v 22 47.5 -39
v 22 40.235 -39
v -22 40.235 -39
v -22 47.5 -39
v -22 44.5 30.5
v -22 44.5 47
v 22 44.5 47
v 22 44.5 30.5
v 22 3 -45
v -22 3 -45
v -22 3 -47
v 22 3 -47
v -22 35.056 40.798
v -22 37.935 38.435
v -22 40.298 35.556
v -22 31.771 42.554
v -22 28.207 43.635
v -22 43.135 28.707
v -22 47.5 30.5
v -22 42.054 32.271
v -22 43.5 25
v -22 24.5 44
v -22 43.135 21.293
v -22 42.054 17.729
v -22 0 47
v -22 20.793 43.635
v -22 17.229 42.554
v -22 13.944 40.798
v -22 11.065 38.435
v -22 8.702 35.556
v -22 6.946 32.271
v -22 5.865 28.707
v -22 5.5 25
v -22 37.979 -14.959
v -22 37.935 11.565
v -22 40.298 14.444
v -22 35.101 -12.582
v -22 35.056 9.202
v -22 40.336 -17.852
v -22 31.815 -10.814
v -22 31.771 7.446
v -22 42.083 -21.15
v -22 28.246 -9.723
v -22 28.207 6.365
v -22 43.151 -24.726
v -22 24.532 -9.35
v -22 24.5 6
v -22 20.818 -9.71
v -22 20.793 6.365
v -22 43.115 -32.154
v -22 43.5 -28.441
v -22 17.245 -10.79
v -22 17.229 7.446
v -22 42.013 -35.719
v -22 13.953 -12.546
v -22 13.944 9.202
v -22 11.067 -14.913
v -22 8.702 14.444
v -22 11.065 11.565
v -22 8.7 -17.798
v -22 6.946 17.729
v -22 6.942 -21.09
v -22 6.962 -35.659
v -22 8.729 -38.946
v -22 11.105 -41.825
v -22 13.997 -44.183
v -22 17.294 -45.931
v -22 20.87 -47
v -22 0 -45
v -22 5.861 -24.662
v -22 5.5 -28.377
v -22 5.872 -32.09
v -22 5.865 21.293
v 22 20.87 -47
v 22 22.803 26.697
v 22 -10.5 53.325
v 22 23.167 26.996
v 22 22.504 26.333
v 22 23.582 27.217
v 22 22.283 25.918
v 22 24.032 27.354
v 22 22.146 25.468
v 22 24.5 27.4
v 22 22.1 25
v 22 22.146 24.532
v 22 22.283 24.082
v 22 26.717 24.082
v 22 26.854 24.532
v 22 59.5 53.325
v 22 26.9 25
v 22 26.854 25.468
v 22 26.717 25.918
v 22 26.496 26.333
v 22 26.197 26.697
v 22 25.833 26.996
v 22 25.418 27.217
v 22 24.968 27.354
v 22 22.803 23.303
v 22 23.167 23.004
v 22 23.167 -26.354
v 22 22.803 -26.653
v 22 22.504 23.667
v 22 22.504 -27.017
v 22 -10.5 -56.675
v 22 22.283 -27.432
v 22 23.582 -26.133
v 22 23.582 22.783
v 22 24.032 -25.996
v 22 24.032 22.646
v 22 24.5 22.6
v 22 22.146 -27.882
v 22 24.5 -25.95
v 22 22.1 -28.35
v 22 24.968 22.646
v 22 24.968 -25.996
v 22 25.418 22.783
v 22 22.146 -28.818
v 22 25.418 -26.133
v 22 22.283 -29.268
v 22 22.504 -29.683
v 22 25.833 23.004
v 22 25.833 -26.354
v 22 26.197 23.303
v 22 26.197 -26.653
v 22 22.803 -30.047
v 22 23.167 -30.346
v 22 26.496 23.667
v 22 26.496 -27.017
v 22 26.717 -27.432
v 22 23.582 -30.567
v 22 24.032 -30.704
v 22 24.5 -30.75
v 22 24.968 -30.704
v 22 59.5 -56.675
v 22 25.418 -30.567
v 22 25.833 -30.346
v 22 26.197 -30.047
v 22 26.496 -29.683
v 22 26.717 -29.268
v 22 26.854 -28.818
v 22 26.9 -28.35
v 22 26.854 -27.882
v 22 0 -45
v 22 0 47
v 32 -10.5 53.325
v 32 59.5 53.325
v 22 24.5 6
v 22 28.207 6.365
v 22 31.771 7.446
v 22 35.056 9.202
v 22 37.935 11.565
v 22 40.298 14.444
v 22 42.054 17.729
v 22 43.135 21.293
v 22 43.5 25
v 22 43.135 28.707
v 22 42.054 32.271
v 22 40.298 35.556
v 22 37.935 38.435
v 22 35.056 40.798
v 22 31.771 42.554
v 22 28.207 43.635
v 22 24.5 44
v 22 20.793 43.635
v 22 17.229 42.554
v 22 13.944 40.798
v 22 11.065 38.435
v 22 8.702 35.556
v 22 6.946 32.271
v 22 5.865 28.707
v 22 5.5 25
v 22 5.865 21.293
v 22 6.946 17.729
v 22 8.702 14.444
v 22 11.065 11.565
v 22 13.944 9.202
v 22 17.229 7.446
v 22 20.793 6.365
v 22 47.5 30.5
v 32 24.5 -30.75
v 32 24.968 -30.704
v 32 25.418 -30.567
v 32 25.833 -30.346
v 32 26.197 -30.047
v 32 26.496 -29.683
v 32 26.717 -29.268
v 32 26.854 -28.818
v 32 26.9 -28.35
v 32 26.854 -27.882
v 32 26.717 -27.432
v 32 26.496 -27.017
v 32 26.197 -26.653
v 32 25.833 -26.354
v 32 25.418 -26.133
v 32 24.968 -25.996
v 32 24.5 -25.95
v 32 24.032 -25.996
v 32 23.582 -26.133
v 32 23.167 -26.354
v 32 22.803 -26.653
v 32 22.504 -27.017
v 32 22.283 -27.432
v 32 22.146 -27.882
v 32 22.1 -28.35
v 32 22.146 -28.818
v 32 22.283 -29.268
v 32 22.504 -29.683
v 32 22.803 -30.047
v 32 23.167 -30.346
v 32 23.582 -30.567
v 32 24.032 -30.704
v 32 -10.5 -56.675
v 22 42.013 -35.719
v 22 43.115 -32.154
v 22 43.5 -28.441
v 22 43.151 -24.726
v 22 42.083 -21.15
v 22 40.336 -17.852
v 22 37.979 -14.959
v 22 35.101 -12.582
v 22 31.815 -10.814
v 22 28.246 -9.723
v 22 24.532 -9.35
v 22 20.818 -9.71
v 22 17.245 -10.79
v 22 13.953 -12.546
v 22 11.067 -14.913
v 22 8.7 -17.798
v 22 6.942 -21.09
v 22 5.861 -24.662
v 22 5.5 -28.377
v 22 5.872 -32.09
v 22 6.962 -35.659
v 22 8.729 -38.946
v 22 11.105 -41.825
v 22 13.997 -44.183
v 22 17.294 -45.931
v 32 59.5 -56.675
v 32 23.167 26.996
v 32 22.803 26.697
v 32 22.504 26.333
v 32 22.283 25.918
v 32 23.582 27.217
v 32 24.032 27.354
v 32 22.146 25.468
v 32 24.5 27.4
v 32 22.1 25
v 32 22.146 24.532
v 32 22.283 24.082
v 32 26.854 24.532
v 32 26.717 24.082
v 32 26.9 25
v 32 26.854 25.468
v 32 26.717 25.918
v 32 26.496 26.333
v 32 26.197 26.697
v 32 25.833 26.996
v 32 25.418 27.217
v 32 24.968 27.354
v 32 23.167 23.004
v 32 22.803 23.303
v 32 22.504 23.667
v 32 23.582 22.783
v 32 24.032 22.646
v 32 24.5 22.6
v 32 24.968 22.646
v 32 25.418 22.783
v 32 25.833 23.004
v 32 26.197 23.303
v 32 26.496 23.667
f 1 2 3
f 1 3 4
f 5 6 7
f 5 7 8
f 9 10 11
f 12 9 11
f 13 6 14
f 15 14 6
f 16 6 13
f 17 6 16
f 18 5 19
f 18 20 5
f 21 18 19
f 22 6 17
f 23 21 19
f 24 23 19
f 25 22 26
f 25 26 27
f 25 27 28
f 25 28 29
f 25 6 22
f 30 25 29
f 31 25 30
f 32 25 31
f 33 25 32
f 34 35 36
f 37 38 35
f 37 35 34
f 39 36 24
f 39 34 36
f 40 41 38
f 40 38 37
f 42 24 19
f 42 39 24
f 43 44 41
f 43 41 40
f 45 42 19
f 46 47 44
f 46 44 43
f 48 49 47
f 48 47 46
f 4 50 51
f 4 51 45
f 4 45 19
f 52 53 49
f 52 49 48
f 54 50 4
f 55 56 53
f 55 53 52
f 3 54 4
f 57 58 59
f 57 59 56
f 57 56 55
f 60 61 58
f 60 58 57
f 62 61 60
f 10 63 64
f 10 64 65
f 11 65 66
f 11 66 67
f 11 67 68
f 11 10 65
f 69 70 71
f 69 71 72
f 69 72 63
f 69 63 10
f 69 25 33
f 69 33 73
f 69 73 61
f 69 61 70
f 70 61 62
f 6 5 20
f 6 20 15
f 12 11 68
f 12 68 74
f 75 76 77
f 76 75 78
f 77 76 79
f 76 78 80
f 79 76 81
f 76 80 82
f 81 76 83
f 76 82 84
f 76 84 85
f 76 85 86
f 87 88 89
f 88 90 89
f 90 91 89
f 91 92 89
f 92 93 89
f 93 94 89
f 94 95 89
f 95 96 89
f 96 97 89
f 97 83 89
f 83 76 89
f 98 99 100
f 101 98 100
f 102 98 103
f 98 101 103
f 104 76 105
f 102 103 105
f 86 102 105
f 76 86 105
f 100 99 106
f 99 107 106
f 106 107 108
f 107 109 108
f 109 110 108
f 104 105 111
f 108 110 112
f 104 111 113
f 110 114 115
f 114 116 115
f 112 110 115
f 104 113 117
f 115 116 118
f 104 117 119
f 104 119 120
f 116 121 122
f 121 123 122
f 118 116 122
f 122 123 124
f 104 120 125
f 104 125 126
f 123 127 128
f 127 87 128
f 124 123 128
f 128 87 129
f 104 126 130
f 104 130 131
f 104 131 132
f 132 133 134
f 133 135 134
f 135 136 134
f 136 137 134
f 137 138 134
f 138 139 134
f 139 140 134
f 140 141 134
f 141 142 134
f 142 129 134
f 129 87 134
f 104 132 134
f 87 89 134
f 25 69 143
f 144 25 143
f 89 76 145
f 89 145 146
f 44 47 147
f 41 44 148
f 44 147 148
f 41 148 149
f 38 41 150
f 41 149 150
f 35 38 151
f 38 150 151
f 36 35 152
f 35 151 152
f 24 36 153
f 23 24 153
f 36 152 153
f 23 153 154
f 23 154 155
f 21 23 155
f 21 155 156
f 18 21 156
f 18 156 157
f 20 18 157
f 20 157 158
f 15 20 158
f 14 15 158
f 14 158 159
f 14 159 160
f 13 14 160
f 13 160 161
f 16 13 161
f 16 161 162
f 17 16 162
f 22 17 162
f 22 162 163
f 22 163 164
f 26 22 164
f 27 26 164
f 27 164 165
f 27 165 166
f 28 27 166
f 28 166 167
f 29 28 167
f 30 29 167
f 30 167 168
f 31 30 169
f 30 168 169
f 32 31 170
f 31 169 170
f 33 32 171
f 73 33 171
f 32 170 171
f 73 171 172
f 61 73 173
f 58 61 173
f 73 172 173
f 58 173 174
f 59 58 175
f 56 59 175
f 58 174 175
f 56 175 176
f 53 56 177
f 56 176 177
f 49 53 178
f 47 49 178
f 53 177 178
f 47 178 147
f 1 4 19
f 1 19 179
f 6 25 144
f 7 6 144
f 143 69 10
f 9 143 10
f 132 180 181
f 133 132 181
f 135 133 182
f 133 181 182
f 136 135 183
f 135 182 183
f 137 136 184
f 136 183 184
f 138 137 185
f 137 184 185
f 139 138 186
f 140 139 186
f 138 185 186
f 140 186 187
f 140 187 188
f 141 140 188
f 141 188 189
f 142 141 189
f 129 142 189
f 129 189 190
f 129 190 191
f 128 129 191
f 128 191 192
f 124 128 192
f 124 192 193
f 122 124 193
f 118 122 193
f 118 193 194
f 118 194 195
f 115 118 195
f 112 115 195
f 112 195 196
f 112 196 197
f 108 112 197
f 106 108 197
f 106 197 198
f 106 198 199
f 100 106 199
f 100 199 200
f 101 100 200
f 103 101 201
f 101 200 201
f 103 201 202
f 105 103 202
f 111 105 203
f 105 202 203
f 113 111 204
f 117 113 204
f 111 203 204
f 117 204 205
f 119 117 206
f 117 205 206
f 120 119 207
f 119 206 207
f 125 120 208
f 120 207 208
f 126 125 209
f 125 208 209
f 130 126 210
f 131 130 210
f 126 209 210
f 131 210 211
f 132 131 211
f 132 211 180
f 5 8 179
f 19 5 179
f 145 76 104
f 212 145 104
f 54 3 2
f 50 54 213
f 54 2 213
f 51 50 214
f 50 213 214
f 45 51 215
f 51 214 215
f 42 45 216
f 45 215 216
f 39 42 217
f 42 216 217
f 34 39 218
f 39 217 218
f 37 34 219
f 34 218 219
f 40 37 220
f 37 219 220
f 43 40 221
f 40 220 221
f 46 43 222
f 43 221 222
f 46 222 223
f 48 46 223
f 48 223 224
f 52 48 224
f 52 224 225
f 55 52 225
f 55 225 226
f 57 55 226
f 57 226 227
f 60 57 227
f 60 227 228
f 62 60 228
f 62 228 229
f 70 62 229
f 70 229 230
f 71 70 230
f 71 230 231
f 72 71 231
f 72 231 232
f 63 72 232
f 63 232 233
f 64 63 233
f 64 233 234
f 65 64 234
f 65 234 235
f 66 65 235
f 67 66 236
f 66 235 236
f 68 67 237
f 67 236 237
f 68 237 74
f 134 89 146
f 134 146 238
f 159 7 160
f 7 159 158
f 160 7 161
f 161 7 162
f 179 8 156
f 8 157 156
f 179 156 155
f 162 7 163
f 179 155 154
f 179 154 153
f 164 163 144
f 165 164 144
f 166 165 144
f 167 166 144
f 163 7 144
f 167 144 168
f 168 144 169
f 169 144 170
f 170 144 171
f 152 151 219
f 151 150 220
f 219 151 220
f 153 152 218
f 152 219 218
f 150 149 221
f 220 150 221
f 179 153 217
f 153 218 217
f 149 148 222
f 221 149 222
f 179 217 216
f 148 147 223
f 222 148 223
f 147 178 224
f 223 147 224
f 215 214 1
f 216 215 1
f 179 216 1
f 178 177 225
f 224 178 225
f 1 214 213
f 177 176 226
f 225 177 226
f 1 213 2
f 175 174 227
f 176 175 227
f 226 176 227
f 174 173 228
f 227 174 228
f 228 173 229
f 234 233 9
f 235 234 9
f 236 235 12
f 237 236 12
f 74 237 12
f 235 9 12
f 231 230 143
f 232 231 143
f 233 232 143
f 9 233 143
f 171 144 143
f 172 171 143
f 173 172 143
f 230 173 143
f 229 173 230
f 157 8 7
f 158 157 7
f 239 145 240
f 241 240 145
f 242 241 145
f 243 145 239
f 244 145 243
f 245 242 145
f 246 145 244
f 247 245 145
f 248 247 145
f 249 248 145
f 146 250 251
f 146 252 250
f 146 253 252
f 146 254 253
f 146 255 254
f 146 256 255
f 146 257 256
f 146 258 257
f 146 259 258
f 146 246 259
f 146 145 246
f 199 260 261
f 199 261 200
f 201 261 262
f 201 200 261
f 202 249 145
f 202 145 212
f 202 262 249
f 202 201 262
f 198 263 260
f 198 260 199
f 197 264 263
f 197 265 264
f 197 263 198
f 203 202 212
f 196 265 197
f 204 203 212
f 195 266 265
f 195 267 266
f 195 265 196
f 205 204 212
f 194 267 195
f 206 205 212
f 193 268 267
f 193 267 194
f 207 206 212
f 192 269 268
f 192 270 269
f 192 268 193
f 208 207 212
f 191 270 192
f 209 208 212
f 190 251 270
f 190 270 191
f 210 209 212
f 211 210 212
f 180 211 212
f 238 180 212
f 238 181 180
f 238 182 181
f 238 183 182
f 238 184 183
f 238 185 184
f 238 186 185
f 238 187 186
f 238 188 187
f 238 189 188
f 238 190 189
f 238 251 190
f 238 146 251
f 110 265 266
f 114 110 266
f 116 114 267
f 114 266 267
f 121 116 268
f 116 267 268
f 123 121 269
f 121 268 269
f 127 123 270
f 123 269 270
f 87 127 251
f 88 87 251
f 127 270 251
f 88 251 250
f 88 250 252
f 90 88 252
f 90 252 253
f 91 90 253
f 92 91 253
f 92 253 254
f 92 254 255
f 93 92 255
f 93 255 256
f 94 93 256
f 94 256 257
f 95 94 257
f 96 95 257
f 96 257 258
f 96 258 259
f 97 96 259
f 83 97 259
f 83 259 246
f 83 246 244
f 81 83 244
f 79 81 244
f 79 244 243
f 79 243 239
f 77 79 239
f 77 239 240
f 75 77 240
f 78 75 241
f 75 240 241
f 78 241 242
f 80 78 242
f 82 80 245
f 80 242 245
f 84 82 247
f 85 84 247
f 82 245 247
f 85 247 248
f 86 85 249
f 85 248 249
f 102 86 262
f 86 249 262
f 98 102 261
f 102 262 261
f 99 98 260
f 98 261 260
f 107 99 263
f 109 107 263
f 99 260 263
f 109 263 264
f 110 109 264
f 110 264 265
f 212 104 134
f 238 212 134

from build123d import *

# Parameters (mm, degrees)
SKETCH1_W           = 44
SKETCH1_H           = 94
BOSS_EXTRUDE1_DEPTH = 47.5
SKETCH2_R           = 19
CUT_EXTRUDE1_DEPTH  = 81.007812119
SKETCH3_W           = 8
SKETCH3_H           = 9
SKETCH3_W_2         = 16.5
SKETCH3_H_2         = 3
SKETCH3_W_3         = 2
CUT_EXTRUDE2_DEPTH  = 81.007812119
SKETCH4_W           = 110
SKETCH4_H           = 70
SKETCH4_R           = 19
BOSS_EXTRUDE2_DEPTH = 10
SKETCH5_R           = 2.4
CUT_EXTRUDE3_DEPTH  = 99.327542555


with BuildPart() as part:
    # Sketch1 → Boss-Extrude1 (new body)
    with BuildSketch(Plane(origin=(0, 0, 0), x_dir=(1, 0, 0), z_dir=(0, 1, 0))):
        Rectangle(SKETCH1_W, SKETCH1_H)
    extrude(amount=BOSS_EXTRUDE1_DEPTH)

    # Sketch2 → Cut-Extrude1 (cut, through all)
    with BuildSketch(Plane(origin=(22, 0, 0), x_dir=(0, 0, -1), z_dir=(1, 0, 0))):
        with Locations((-25, 24.5)):
            Circle(SKETCH2_R)
        with Locations((28.35, 24.5)):
            Circle(SKETCH2_R)
    extrude(amount=-CUT_EXTRUDE1_DEPTH, mode=Mode.SUBTRACT)

    # Sketch3 → Cut-Extrude2 (cut, through all)
    with BuildSketch(Plane(origin=(22, 0, 0), x_dir=(0, 0, -1), z_dir=(1, 0, 0))):
        with Locations((43, 43)):
            Rectangle(SKETCH3_W, SKETCH3_H)
        with Locations((-38.75, 46)):
            Rectangle(SKETCH3_W_2, SKETCH3_H_2)
        with Locations((46, 1.5)):
            Rectangle(SKETCH3_W_3, SKETCH3_H_2)
    extrude(amount=-CUT_EXTRUDE2_DEPTH, mode=Mode.SUBTRACT)


with BuildPart() as cut_extrude2_kept_piece:
    # of the separate pieces the step leaves, the one the design keeps (cut_extrude2_pieces_kept)
    add(part.part.solids().sort_by_distance((-22, 0, 47))[0])


with BuildPart() as body_2:
    # Sketch4 → Boss-Extrude2 (new body)
    # profile 1 of 3: a face of its own
    with BuildSketch(Plane(origin=(22, 0, 0), x_dir=(0, 0, -1), z_dir=(1, 0, 0))):
        with Locations((1.675, 24.5)):
            Rectangle(SKETCH4_W, SKETCH4_H)
        with BuildLine():
            Line((-47, 0), (45, 0))
            Line((45, 0), (45, 3))
            Line((45, 3), (47, 3))
            Line((47, 3), (47, 20.869917356))
            ThreePointArc((47, 20.869917356), (10.78952759, 17.245359504), (39, 40.234595641))
            Line((39, 40.234595641), (39, 47.5))
            Line((39, 47.5), (-30.5, 47.5))
            Line((-30.5, 47.5), (-30.5, 44.5))
            Line((-30.5, 44.5), (-47, 44.5))
            Line((-47, 44.5), (-47, 0))
        make_face(mode=Mode.SUBTRACT)
    # profile 2 of 3: a face of its own
    with BuildSketch(Plane(origin=(22, 0, 0), x_dir=(0, 0, -1), z_dir=(1, 0, 0))):
        with BuildLine():
            Line((-47, 44.5), (-47, 0))
            Line((-47, 0), (45, 0))
            Line((45, 0), (45, 3))
            Line((45, 3), (47, 3))
            Line((47, 3), (47, 20.869917356))
            ThreePointArc((47, 20.869917356), (10.78952759, 17.245359504), (39, 40.234595641))
            Line((39, 40.234595641), (39, 47.5))
            Line((39, 47.5), (-30.5, 47.5))
            Line((-30.5, 47.5), (-30.5, 44.5))
            Line((-30.5, 44.5), (-47, 44.5))
        make_face()
        with Locations((-25, 24.5)):
            Circle(SKETCH4_R, mode=Mode.SUBTRACT)
    # profile 3 of 3: a face of its own
    with BuildSketch(Plane(origin=(22, 0, 0), x_dir=(0, 0, -1), z_dir=(1, 0, 0))):
        with Locations((-25, 24.5)):
            Circle(SKETCH4_R)
    extrude(amount=BOSS_EXTRUDE2_DEPTH)

    # Sketch5 → Cut-Extrude3 (cut, through all)
    with BuildSketch(Plane(origin=(32, 0, 0), x_dir=(0, 0, -1), z_dir=(1, 0, 0))):
        with Locations((-25, 24.5)):
            Circle(SKETCH5_R)
        with Locations((28.35, 24.5)):
            Circle(SKETCH5_R)
    extrude(amount=-CUT_EXTRUDE3_DEPTH, mode=Mode.SUBTRACT)


solid = Compound([cut_extrude2_kept_piece.part, body_2.part])
